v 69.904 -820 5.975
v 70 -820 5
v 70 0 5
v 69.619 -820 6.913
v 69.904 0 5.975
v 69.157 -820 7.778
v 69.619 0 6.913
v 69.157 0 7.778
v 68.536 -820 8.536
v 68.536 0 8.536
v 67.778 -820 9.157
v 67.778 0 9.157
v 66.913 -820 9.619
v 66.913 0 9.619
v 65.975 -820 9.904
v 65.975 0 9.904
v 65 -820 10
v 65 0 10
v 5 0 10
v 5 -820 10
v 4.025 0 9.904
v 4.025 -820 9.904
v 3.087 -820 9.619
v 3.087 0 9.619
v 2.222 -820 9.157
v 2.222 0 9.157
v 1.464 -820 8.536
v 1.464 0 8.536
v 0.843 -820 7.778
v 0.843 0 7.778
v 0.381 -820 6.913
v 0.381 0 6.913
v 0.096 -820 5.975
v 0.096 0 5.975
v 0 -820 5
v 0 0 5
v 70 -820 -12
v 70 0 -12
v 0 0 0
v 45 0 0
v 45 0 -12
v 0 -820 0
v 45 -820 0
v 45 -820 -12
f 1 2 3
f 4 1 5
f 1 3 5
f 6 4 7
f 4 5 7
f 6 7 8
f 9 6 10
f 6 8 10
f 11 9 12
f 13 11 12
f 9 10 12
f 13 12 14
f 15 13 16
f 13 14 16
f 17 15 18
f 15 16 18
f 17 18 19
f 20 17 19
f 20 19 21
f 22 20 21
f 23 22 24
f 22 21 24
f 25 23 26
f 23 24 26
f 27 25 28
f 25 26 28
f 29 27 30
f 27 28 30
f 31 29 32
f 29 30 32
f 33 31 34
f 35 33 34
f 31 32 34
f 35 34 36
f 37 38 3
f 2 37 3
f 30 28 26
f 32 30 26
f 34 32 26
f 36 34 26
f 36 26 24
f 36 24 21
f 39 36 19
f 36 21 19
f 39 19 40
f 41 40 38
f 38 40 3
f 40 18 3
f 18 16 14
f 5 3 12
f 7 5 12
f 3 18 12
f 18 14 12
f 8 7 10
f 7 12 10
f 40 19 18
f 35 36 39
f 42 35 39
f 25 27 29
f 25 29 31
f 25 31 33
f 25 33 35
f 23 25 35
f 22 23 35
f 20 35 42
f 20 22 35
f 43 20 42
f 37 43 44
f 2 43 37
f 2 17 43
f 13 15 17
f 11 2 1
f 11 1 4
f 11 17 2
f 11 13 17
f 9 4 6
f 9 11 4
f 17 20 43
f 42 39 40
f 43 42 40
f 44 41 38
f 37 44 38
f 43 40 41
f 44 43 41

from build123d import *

# Parameters (mm, degrees)
F1_DEPTH = 820


with BuildPart() as f1:
    # F0 (on Front) → F1 (new body)
    with BuildSketch(Plane.XZ):
        with BuildLine():
            Line((0, 5), (0, 0))
            Line((0, 0), (45, 0))
            Line((45, 0), (45, -12))
            Line((45, -12), (70, -12))
            Line((70, -12), (70, 5))
            ThreePointArc((70, 5), (68.535534, 8.535534), (65, 10))
            Line((65, 10), (5, 10))
            ThreePointArc((5, 10), (1.464466, 8.535534), (0, 5))
        make_face()
    extrude(amount=F1_DEPTH)


solid = f1.part
